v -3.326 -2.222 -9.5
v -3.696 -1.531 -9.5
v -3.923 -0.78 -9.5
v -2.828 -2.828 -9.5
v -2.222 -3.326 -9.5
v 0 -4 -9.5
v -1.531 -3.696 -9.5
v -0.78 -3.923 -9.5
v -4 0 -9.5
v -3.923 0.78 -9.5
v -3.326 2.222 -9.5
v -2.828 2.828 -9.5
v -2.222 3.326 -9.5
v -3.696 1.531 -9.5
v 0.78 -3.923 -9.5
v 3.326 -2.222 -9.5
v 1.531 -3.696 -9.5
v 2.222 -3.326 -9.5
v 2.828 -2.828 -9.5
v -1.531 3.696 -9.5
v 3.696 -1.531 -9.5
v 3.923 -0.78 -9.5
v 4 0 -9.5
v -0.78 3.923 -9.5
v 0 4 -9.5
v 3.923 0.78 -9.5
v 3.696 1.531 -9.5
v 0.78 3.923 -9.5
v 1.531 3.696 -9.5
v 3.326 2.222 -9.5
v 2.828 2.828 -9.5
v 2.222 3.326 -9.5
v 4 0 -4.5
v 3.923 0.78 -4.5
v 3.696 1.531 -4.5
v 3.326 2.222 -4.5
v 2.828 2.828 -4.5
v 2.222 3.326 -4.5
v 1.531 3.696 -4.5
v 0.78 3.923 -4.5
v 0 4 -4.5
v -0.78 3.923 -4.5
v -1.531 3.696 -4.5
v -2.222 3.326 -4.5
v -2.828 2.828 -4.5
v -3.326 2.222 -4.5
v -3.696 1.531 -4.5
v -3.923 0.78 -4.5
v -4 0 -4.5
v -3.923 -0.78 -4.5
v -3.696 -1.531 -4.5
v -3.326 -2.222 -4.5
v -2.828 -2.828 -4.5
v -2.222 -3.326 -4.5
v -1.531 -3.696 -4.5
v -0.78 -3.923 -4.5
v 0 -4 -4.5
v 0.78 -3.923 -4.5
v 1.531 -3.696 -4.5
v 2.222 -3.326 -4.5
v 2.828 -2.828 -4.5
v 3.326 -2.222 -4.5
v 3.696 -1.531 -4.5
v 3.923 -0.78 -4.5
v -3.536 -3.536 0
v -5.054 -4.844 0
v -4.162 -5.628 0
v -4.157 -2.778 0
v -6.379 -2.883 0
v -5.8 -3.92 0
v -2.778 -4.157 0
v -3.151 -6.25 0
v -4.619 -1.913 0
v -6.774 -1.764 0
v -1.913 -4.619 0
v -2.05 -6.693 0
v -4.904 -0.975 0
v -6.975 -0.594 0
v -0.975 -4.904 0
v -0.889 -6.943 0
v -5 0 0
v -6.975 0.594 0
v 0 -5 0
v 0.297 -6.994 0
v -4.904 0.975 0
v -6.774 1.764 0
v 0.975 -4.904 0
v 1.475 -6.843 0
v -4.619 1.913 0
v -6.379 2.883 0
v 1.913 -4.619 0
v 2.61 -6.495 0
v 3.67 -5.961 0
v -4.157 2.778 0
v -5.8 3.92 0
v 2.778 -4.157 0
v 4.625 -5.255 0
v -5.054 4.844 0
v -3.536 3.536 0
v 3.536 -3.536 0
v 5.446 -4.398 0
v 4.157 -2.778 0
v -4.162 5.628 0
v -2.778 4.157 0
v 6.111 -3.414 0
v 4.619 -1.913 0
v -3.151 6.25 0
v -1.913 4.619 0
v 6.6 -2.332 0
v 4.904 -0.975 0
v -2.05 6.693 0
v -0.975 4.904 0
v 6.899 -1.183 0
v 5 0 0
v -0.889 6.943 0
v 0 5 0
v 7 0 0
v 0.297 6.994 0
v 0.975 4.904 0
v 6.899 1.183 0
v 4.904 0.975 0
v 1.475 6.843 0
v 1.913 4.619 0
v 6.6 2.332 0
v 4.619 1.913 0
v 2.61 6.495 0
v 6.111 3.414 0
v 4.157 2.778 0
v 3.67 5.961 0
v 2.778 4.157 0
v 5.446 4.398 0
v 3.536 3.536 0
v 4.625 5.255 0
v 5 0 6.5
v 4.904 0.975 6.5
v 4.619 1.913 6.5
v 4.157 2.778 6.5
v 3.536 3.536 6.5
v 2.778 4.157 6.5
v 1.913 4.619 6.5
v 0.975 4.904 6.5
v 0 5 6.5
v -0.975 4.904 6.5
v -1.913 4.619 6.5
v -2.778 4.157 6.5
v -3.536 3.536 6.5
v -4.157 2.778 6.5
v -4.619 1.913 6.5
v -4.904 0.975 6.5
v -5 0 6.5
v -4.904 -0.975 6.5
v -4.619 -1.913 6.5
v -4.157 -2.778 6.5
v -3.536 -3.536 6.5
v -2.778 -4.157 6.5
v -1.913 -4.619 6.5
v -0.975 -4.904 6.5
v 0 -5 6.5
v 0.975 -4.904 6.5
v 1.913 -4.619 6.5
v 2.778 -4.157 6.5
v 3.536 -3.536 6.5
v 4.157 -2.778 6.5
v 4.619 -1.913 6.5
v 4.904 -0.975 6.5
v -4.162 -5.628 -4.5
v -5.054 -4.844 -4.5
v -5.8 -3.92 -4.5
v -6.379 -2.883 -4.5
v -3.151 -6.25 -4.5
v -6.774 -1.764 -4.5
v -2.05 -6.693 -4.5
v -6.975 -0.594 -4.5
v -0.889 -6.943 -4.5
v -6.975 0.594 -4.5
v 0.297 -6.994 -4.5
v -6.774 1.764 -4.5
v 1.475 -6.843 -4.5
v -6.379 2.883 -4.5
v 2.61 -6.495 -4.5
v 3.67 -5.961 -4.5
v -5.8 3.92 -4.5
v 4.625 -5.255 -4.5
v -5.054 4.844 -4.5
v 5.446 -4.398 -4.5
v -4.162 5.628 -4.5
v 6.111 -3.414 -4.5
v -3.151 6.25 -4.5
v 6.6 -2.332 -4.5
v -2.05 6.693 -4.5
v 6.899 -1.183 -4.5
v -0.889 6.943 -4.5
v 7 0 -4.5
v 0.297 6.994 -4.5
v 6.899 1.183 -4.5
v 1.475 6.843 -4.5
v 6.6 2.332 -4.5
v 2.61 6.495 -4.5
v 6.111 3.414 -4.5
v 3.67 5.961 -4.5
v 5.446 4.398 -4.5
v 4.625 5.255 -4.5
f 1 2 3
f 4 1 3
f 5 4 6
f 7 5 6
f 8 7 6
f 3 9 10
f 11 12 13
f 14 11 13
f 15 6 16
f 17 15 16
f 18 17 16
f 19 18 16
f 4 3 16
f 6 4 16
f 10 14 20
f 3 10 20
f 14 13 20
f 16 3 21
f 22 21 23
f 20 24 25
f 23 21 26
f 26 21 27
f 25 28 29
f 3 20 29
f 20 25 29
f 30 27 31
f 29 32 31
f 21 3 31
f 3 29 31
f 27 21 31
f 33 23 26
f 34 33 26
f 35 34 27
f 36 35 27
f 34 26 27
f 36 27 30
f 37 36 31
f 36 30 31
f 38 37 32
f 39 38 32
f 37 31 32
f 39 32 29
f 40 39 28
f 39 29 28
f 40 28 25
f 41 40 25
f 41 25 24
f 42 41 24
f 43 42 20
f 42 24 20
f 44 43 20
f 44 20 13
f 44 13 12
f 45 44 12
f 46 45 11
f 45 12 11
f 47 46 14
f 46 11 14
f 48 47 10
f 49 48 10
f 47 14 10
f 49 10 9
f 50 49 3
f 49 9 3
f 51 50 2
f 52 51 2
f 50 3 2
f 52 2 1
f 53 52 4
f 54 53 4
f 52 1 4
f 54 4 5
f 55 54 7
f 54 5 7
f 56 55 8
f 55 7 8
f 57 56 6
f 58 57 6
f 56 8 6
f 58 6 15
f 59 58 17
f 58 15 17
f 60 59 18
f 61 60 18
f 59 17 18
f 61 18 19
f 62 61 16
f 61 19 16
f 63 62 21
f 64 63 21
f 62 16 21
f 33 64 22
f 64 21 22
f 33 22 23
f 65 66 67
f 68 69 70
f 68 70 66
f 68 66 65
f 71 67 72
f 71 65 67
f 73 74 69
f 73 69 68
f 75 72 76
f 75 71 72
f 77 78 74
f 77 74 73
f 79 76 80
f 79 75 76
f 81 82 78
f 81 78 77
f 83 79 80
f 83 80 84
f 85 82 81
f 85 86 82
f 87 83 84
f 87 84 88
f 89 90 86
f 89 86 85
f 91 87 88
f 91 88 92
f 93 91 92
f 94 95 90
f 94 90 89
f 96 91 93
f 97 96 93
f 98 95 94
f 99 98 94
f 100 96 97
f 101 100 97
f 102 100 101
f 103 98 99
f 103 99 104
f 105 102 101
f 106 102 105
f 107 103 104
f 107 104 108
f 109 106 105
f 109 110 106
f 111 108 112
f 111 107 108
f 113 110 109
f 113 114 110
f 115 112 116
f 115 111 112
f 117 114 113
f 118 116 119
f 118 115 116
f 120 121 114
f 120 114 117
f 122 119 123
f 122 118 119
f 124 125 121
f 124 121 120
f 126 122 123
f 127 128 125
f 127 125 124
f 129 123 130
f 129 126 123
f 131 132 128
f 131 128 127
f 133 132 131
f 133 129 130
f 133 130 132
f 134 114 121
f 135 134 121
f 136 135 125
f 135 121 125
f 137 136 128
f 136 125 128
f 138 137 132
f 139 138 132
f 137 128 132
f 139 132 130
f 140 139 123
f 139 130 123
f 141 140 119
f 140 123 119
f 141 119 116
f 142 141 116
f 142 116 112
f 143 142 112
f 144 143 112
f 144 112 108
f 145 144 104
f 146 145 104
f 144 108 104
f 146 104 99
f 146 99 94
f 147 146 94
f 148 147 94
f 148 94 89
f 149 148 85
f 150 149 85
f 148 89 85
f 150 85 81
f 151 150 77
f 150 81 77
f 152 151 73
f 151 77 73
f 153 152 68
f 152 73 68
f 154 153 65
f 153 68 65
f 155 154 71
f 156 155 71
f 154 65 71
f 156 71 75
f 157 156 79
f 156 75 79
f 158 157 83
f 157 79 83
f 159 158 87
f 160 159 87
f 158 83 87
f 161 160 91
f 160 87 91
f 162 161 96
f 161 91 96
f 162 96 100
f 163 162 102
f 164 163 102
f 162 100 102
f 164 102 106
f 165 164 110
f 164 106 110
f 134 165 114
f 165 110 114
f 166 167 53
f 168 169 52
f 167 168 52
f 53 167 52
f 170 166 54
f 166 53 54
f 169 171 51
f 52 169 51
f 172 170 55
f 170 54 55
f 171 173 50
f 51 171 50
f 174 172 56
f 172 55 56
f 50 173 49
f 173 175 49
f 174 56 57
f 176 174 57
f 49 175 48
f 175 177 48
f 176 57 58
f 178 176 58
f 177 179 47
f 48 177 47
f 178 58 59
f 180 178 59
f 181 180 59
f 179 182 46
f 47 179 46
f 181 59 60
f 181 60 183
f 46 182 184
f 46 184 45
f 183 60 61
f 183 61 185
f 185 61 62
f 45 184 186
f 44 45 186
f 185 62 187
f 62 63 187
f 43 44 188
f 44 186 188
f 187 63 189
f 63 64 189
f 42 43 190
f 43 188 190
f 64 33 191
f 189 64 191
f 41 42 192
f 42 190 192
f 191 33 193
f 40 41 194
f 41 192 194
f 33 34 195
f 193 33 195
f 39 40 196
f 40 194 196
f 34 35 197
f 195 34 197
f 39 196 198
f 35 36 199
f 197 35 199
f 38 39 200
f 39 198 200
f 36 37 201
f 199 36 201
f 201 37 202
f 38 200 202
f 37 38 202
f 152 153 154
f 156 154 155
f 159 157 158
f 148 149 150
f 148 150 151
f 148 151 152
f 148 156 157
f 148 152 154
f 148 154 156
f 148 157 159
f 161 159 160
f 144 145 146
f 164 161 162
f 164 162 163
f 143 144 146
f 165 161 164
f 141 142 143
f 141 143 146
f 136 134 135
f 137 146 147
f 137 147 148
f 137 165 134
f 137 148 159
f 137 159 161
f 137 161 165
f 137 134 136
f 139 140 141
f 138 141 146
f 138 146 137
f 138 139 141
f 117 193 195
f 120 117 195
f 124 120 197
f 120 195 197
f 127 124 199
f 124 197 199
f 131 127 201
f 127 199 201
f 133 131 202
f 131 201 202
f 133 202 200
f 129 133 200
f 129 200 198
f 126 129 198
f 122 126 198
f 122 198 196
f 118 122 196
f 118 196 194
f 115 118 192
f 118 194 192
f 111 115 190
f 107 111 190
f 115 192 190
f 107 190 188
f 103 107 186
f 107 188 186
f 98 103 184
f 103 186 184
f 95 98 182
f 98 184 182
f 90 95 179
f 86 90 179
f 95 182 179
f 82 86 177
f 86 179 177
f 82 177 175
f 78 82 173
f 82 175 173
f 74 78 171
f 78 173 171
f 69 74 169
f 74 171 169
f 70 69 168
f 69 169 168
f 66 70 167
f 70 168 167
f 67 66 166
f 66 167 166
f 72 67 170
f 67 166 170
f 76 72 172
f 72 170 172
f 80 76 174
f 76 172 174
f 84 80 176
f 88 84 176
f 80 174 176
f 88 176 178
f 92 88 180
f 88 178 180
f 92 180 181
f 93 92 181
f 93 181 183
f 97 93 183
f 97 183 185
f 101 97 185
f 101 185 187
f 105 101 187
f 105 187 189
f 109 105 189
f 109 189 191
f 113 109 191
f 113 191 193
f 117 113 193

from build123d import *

# Parameters (mm, degrees)
CYLINDER001_R     = 7
CYLINDER001_DEPTH = 4.5
CYLINDER002_R     = 4
CYLINDER002_DEPTH = 5
CYLINDER_R        = 5
CYLINDER_DEPTH    = 6.5


with BuildPart() as cylinder:
    # Cylinder001 → Cylinder001 (new body)
    with BuildSketch(Plane.XY.offset(-4.5)):
        Circle(CYLINDER001_R)
    extrude(amount=CYLINDER001_DEPTH)


with BuildPart() as cylinder001:
    # Cylinder002 → Cylinder002 (new body)
    with BuildSketch(Plane.XY.offset(-9.5)):
        Circle(CYLINDER002_R)
    extrude(amount=CYLINDER002_DEPTH)


with BuildPart() as fusion:
    # Cylinder → Cylinder (new body)
    with BuildSketch(Plane.XY):
        Circle(CYLINDER_R)
    extrude(amount=CYLINDER_DEPTH)

    # Fusion: union Cylinder, Cylinder001
    add(cylinder.part)
    add(cylinder001.part)


solid = fusion.part
